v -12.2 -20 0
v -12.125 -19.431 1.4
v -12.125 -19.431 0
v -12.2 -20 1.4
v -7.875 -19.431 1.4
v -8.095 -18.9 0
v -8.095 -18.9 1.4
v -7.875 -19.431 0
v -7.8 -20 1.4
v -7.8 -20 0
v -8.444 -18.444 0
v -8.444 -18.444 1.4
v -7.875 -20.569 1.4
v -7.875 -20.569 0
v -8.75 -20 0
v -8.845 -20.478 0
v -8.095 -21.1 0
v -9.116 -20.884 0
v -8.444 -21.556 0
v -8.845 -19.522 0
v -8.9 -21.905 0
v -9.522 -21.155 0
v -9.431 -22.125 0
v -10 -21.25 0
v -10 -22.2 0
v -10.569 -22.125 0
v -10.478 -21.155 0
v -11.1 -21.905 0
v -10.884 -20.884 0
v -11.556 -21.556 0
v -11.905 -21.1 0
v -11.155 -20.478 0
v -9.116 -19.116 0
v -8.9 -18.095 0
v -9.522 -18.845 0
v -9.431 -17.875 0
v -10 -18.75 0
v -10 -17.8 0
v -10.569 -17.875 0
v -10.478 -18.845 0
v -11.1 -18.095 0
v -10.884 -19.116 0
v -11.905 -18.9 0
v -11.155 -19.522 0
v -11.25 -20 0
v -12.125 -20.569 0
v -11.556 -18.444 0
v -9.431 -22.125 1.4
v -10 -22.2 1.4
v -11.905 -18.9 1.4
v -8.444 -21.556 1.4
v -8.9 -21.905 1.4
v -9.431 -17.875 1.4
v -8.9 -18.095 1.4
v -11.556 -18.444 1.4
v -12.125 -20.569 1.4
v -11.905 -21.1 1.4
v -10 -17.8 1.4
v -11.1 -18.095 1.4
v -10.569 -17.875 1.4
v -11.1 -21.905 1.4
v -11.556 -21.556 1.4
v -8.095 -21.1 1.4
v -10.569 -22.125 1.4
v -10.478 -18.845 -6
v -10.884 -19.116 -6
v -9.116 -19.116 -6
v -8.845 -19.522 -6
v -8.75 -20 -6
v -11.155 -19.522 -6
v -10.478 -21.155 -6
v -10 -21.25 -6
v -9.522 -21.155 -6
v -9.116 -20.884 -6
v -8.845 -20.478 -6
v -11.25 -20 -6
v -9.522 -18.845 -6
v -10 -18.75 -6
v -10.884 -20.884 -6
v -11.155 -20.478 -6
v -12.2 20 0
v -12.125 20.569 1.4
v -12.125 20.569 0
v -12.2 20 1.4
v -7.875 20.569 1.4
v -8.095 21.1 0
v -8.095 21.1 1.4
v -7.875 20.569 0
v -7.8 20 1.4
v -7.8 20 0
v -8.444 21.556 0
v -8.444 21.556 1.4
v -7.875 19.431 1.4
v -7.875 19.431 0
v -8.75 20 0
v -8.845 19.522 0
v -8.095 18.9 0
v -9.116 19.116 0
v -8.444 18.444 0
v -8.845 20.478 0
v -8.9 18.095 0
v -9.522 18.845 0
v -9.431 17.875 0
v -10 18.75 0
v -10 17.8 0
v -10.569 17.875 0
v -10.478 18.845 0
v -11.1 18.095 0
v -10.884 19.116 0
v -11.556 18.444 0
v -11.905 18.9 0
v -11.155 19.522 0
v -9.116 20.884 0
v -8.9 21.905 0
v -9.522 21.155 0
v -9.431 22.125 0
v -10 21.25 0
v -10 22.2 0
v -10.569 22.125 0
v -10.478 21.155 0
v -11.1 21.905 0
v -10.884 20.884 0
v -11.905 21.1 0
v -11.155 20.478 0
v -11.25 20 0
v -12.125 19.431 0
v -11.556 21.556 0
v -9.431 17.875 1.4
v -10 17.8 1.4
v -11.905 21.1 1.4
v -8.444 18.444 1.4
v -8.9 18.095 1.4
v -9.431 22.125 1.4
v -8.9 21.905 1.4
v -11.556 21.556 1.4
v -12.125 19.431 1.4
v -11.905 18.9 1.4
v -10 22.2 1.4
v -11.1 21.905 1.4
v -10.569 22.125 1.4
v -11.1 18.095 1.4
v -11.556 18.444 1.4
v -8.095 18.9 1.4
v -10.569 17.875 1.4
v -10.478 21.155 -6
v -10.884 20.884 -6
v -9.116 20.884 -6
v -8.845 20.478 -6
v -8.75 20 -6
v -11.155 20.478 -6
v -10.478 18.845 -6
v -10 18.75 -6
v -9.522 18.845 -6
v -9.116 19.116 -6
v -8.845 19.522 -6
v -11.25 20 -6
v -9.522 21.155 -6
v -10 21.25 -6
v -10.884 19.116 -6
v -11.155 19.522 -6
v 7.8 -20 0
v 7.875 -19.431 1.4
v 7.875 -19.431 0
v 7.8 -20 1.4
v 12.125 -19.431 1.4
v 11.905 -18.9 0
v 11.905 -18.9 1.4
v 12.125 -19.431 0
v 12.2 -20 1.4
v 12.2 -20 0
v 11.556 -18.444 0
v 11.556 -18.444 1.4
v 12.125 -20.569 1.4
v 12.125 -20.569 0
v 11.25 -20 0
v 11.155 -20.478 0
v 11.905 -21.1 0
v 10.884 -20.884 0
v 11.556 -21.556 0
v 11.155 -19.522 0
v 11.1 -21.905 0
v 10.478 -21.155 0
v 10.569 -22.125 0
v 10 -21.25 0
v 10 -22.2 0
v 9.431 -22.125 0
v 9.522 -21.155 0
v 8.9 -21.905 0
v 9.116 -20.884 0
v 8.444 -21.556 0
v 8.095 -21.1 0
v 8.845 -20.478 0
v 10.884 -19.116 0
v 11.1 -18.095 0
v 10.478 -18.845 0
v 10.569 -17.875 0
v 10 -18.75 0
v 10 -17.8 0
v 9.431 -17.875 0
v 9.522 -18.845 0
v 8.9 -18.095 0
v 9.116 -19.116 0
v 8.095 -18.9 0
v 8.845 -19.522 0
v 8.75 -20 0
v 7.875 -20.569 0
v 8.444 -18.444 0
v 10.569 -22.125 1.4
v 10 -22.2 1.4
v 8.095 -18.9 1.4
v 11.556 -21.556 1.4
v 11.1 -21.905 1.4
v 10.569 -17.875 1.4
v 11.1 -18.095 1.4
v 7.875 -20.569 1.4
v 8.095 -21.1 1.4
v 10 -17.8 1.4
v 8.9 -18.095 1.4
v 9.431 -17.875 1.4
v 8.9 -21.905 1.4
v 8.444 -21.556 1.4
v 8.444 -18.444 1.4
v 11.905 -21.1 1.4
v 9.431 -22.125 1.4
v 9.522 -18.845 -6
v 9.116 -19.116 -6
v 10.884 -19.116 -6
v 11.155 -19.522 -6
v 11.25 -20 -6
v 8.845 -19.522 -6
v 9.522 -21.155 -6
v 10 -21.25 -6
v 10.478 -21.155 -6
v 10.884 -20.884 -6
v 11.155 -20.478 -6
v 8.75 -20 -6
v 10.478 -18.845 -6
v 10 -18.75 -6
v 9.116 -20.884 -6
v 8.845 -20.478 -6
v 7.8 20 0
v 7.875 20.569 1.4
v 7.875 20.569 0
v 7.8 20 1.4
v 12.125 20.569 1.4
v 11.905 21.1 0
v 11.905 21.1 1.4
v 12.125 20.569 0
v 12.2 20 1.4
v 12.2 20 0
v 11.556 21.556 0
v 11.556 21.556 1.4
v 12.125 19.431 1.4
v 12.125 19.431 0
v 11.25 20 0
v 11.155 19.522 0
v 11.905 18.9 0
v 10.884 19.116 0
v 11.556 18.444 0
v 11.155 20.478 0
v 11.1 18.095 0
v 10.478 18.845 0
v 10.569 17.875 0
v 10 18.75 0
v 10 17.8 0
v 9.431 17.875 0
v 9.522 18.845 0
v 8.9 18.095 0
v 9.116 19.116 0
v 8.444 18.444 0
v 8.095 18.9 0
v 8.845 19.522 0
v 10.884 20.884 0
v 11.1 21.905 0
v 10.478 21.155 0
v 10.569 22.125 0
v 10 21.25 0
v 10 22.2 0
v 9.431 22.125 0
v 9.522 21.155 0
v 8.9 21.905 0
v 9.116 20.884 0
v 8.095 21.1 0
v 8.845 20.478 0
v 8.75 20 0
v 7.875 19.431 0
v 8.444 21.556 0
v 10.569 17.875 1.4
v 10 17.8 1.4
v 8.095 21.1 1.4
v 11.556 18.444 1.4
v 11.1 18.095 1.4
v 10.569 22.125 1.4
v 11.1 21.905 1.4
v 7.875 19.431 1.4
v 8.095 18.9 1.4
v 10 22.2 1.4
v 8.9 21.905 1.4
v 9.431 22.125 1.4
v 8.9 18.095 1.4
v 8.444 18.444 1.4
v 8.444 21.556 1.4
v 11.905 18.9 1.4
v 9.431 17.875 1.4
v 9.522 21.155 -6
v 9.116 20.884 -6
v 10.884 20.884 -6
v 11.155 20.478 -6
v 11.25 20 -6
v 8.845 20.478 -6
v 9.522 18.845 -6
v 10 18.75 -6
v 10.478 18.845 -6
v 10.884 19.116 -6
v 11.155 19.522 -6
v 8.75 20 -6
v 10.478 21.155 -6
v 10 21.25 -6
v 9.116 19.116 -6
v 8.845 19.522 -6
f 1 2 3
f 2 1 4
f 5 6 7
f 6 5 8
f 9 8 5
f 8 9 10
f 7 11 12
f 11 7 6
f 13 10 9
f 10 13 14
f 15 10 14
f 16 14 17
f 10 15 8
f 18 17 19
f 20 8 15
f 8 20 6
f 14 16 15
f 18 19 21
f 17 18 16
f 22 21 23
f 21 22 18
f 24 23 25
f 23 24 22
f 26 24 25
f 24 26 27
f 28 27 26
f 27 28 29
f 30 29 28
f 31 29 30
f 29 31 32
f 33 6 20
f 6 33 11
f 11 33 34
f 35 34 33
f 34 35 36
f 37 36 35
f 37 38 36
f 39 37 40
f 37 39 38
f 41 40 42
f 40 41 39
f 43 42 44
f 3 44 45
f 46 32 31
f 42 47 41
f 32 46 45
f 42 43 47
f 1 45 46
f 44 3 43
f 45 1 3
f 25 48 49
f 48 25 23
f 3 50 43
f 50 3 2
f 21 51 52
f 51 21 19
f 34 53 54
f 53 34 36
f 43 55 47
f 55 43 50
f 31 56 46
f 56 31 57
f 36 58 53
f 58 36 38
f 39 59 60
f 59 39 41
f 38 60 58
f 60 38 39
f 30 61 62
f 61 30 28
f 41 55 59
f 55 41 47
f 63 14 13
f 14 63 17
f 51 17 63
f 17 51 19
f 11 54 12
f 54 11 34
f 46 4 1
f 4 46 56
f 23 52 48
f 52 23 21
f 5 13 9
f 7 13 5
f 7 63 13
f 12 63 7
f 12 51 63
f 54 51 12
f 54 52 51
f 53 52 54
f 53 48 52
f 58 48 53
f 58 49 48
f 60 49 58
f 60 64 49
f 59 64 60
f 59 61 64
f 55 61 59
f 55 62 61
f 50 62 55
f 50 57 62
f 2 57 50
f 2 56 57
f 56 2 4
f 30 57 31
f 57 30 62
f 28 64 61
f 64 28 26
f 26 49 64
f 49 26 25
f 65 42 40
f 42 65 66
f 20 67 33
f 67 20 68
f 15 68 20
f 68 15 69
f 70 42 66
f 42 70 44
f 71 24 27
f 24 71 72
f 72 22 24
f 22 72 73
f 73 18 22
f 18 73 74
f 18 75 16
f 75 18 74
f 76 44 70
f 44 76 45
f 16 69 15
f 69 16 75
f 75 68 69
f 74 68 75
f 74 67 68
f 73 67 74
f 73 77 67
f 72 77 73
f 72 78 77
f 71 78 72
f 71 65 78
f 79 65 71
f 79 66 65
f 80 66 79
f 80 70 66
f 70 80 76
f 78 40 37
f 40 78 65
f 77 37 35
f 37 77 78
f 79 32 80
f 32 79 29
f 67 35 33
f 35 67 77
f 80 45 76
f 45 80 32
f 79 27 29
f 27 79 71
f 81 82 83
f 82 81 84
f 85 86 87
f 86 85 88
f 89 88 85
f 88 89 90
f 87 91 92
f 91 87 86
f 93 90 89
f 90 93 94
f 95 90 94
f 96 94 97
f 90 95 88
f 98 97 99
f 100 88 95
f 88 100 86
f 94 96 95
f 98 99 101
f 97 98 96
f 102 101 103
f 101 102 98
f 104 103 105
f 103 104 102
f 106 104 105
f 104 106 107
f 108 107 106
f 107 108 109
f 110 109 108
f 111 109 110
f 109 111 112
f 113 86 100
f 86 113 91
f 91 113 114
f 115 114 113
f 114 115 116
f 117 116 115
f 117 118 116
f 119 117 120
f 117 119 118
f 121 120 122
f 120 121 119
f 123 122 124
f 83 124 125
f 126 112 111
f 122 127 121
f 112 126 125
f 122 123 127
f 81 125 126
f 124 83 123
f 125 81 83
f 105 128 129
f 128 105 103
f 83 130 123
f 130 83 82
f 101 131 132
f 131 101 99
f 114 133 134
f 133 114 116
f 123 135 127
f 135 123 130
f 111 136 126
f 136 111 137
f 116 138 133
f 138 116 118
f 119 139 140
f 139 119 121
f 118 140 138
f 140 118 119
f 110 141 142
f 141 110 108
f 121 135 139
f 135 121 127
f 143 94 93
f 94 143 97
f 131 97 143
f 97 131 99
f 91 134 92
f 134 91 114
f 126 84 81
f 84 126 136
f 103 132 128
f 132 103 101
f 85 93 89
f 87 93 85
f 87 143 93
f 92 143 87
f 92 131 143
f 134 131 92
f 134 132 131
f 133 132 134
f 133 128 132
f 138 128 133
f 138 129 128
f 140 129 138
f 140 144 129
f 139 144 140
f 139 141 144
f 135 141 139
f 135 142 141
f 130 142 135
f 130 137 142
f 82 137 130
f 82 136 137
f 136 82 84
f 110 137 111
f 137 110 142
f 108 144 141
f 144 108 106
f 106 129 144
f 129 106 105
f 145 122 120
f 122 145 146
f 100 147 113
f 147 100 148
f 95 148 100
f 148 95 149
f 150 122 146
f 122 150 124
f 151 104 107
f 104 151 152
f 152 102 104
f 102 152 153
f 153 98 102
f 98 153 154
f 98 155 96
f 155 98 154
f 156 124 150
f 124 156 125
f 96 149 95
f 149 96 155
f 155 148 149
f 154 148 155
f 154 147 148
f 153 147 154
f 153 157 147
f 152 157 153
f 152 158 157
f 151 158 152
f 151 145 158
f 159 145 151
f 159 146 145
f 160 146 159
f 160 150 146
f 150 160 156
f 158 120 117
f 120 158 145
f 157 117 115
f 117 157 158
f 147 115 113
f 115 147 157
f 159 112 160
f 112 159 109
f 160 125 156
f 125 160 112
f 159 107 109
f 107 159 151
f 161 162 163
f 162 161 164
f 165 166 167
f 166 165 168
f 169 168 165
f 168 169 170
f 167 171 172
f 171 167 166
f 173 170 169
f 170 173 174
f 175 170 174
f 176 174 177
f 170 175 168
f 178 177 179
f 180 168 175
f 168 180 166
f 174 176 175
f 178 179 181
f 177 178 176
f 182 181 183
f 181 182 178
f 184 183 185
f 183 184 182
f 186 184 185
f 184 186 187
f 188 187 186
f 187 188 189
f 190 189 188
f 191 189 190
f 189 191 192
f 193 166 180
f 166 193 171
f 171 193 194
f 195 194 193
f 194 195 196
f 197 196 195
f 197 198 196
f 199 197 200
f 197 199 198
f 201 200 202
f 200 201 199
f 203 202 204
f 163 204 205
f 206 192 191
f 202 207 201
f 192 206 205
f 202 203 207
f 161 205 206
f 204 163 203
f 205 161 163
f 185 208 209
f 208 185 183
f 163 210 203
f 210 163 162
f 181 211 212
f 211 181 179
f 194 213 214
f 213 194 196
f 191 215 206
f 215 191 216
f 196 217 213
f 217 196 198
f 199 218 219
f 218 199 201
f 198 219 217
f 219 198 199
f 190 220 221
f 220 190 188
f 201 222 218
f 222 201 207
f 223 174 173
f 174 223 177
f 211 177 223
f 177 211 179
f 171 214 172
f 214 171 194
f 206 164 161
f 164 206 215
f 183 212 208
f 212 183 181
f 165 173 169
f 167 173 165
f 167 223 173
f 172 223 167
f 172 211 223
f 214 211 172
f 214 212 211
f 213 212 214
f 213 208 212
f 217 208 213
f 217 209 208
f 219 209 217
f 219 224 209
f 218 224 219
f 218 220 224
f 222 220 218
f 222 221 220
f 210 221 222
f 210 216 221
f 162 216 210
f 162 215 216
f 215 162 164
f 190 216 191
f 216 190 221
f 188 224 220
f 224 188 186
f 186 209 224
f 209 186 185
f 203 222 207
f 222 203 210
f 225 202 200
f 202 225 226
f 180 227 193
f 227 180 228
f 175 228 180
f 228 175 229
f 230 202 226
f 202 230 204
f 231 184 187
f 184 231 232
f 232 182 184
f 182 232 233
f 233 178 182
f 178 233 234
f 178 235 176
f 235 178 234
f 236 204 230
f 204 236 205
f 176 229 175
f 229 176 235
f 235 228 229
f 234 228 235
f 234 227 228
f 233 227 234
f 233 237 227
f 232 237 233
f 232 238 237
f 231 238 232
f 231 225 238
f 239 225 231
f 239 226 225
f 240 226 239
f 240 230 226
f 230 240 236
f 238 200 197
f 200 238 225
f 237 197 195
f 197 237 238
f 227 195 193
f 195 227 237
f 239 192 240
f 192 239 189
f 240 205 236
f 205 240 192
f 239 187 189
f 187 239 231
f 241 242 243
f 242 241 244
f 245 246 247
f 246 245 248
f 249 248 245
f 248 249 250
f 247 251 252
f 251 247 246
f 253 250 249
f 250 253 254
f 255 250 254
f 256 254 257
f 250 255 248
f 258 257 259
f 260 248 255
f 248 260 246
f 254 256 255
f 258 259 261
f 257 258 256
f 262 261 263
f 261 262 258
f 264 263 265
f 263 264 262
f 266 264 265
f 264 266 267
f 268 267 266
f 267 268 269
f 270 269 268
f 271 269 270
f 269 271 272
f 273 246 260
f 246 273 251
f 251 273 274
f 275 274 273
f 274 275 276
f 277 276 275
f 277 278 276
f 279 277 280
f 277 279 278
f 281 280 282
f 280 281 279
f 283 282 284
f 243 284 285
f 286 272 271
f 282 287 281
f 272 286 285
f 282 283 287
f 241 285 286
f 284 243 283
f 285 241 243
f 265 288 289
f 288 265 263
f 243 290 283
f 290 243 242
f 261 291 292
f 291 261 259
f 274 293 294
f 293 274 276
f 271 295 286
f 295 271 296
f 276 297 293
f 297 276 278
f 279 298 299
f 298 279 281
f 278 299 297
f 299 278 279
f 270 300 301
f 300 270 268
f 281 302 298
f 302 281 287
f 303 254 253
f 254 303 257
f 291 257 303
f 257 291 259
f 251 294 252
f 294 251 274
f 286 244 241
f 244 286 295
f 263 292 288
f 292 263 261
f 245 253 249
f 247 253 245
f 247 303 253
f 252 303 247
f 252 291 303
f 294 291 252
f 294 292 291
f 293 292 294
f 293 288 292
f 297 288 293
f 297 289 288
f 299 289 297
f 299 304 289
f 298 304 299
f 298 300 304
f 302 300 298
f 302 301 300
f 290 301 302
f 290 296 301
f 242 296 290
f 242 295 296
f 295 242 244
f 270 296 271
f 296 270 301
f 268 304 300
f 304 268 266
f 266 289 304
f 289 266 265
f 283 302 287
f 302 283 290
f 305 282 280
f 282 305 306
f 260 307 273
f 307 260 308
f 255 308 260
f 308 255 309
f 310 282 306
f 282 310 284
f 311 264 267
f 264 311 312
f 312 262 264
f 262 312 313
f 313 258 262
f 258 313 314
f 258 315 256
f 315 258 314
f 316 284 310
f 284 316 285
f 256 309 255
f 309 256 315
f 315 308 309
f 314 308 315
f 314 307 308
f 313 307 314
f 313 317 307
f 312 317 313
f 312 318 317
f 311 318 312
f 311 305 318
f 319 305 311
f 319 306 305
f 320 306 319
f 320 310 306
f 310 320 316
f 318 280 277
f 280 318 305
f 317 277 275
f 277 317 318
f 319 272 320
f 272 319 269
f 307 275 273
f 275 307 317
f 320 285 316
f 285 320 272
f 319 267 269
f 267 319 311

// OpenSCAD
// file: ../../screw-post/screw-post.scad
//-----------------------------------------------------------------------
// Screw post: a round post off the floor that a board screws down onto
//
// Two ways to fix:
//   "nut"  clearance hole through the post and floor; the nut sits in a hex
//          trap in the floor's underside, so the screw goes in from the top
//   "tap"  a pilot hole the screw cuts its own thread in (one or two fittings
//          in PLA/PETG); blind, the floor stays whole underneath
// and "head" for a screw up from below (head in a counterbore, nut on top).
//
// Modules, all in the same frame:
//   screwPostGhost()     the screw (and nut), for previews
//   screwPost()          the post: add to the floor
//   screwPostFloorCut()  subtract from the floor: nut trap / counterbore and hole
//
// Frame: origin on the floor top, on the post's axis. Z up; the floor is
// Z = -floorThick .. 0. Units: mm.
//
// Sizes: "M2", "M2.5", "M3". screwPostScrew(size, ...) says which screw length
// reaches, so a project can assert it has that screw in the kit.
//-----------------------------------------------------------------------

//-- [name, screw Ø, nut across flats, nut thick, head Ø, head height, tap hole, post Ø]
//-- Nuts ISO 4032; heads ISO 7380 button. Tap holes: the usual ~0.8 x Ø for plastic
screwSizes = [
  ["M2",   2.0, 4.0, 1.6, 3.5, 1.1, 1.6, 5.0],
  ["M2.5", 2.5, 5.0, 2.0, 4.4, 1.4, 2.1, 6.0],    // head 4.4: measured on the kit's M2.5 (controller base)
  ["M3",   3.0, 5.5, 2.4, 5.7, 1.65, 2.5, 7.0],
];

screwHoleClear = 0.4;     // added to the screw Ø for a clearance hole
screwNutClear  = 0.3;     // CAL: across flats, nut trap over the nut. Set by the fit piece
screwTapClear  = 0.0;     // CAL: added to the tap hole. Set by the fit piece
screwHeadClear = 0.6;     // counterbore over the head Ø

function screwSize(size) = let (i = search([size], screwSizes)[0])
  assert(i != [] && i != undef, str("unknown screw size ", size)) screwSizes[i];
function screwDia(size)    = screwSize(size)[1];
function screwNutAF(size)  = screwSize(size)[2];
function screwNutH(size)   = screwSize(size)[3];
function screwHeadDia(size)= screwSize(size)[4];
function screwHeadH(size)  = screwSize(size)[5];
function screwPostDia(size)= screwSize(size)[7];

//-- Shortest screw that fills the nut, from the top of the clamped part (h + clamp
//-- above the floor) down to the nut trap's underside. Round up to a length you have.
function screwPostScrew(size, h, floorThick, clamp = 1.6) = h + clamp + floorThick;

module screwPostGhost(size, h, floorThick, clamp = 1.6, length, how = "nut")
{
  d = screwDia(size);
  L = is_undef(length) ? screwPostScrew(size, h, floorThick, clamp) : length;
  top = h + clamp;
  if (how == "head")
  {
    %color("Silver") translate([0, 0, -floorThick]) cylinder(d = screwHeadDia(size), h = screwHeadH(size), $fn = 24);
    %color("Silver") translate([0, 0, -floorThick + screwHeadH(size)]) cylinder(d = d, h = L, $fn = 16);
  }
  else
  {
    %color("Silver") translate([0, 0, top]) cylinder(d = screwHeadDia(size), h = screwHeadH(size), $fn = 24);
    %color("Silver") translate([0, 0, top - L]) cylinder(d = d, h = L, $fn = 16);
    if (how == "nut")
      %color("DimGray") translate([0, 0, -floorThick]) rotate([0, 0, 30]) cylinder(d = screwNutAF(size)/cos(30), h = screwNutH(size), $fn = 6);
  }
}

//-- how: "nut" | "head" (through hole) or "tap" (blind pilot hole). postDia defaults by size
module screwPost(size, h, how = "nut", postDia, tapClear = screwTapClear)
{
  pd = is_undef(postDia) ? screwPostDia(size) : postDia;
  hole = how == "tap" ? screwSize(size)[6] + tapClear : screwDia(size) + screwHoleClear;
  difference()
  {
    translate([0, 0, -0.01]) cylinder(d = pd, h = h + 0.01, $fn = 40);
    translate([0, 0, how == "tap" ? 0.6 : -1]) cylinder(d = hole, h = h + 2, $fn = 24);
    //-- lead-in so the screw starts square
    translate([0, 0, h - 0.4]) cylinder(d1 = hole, d2 = hole + 0.8, h = 0.41, $fn = 24);
  }
}

//-- "nut": hex trap from the underside, opening a little over the nut so it sits flush.
//-- "head": counterbore for the head. "tap": nothing.
module screwPostFloorCut(size, floorThick, how = "nut", nutClear = screwNutClear)
{
  d = screwDia(size) + screwHoleClear;
  if (how == "nut")
  {
    af = screwNutAF(size) + nutClear;
    translate([0, 0, -floorThick - 1]) rotate([0, 0, 30]) cylinder(d = af/cos(30), h = screwNutH(size) + 0.1 + 1, $fn = 6);
    translate([0, 0, -floorThick - 1]) cylinder(d = d + 0.4, h = floorThick + 2, $fn = 24);
  }
  if (how == "head")
  {
    translate([0, 0, -floorThick - 1]) cylinder(d = screwHeadDia(size) + screwHeadClear, h = screwHeadH(size) + 0.2 + 1, $fn = 32);
    translate([0, 0, -floorThick - 1]) cylinder(d = d + 0.4, h = floorThick + 2, $fn = 24);
  }
  assert(how == "tap" || floorThick >= (how == "nut" ? screwNutH(size) : screwHeadH(size)) + 0.1 + 0.3,
         str("floor too thin for the ", size, " ", how));
}
// main file
// The carrier's M2.5 x 6 screws as solids, for the catalogue (the Ghost is % so it never
// renders): heads on the plate's top at its four corners, beside the clip's stops.
use <../wago-221.scad>
use <../../carrier/carrier.scad>

name = "221-415";
s = wagoCarrierSize(name);

carrierScrews(s[0], s[1]);
